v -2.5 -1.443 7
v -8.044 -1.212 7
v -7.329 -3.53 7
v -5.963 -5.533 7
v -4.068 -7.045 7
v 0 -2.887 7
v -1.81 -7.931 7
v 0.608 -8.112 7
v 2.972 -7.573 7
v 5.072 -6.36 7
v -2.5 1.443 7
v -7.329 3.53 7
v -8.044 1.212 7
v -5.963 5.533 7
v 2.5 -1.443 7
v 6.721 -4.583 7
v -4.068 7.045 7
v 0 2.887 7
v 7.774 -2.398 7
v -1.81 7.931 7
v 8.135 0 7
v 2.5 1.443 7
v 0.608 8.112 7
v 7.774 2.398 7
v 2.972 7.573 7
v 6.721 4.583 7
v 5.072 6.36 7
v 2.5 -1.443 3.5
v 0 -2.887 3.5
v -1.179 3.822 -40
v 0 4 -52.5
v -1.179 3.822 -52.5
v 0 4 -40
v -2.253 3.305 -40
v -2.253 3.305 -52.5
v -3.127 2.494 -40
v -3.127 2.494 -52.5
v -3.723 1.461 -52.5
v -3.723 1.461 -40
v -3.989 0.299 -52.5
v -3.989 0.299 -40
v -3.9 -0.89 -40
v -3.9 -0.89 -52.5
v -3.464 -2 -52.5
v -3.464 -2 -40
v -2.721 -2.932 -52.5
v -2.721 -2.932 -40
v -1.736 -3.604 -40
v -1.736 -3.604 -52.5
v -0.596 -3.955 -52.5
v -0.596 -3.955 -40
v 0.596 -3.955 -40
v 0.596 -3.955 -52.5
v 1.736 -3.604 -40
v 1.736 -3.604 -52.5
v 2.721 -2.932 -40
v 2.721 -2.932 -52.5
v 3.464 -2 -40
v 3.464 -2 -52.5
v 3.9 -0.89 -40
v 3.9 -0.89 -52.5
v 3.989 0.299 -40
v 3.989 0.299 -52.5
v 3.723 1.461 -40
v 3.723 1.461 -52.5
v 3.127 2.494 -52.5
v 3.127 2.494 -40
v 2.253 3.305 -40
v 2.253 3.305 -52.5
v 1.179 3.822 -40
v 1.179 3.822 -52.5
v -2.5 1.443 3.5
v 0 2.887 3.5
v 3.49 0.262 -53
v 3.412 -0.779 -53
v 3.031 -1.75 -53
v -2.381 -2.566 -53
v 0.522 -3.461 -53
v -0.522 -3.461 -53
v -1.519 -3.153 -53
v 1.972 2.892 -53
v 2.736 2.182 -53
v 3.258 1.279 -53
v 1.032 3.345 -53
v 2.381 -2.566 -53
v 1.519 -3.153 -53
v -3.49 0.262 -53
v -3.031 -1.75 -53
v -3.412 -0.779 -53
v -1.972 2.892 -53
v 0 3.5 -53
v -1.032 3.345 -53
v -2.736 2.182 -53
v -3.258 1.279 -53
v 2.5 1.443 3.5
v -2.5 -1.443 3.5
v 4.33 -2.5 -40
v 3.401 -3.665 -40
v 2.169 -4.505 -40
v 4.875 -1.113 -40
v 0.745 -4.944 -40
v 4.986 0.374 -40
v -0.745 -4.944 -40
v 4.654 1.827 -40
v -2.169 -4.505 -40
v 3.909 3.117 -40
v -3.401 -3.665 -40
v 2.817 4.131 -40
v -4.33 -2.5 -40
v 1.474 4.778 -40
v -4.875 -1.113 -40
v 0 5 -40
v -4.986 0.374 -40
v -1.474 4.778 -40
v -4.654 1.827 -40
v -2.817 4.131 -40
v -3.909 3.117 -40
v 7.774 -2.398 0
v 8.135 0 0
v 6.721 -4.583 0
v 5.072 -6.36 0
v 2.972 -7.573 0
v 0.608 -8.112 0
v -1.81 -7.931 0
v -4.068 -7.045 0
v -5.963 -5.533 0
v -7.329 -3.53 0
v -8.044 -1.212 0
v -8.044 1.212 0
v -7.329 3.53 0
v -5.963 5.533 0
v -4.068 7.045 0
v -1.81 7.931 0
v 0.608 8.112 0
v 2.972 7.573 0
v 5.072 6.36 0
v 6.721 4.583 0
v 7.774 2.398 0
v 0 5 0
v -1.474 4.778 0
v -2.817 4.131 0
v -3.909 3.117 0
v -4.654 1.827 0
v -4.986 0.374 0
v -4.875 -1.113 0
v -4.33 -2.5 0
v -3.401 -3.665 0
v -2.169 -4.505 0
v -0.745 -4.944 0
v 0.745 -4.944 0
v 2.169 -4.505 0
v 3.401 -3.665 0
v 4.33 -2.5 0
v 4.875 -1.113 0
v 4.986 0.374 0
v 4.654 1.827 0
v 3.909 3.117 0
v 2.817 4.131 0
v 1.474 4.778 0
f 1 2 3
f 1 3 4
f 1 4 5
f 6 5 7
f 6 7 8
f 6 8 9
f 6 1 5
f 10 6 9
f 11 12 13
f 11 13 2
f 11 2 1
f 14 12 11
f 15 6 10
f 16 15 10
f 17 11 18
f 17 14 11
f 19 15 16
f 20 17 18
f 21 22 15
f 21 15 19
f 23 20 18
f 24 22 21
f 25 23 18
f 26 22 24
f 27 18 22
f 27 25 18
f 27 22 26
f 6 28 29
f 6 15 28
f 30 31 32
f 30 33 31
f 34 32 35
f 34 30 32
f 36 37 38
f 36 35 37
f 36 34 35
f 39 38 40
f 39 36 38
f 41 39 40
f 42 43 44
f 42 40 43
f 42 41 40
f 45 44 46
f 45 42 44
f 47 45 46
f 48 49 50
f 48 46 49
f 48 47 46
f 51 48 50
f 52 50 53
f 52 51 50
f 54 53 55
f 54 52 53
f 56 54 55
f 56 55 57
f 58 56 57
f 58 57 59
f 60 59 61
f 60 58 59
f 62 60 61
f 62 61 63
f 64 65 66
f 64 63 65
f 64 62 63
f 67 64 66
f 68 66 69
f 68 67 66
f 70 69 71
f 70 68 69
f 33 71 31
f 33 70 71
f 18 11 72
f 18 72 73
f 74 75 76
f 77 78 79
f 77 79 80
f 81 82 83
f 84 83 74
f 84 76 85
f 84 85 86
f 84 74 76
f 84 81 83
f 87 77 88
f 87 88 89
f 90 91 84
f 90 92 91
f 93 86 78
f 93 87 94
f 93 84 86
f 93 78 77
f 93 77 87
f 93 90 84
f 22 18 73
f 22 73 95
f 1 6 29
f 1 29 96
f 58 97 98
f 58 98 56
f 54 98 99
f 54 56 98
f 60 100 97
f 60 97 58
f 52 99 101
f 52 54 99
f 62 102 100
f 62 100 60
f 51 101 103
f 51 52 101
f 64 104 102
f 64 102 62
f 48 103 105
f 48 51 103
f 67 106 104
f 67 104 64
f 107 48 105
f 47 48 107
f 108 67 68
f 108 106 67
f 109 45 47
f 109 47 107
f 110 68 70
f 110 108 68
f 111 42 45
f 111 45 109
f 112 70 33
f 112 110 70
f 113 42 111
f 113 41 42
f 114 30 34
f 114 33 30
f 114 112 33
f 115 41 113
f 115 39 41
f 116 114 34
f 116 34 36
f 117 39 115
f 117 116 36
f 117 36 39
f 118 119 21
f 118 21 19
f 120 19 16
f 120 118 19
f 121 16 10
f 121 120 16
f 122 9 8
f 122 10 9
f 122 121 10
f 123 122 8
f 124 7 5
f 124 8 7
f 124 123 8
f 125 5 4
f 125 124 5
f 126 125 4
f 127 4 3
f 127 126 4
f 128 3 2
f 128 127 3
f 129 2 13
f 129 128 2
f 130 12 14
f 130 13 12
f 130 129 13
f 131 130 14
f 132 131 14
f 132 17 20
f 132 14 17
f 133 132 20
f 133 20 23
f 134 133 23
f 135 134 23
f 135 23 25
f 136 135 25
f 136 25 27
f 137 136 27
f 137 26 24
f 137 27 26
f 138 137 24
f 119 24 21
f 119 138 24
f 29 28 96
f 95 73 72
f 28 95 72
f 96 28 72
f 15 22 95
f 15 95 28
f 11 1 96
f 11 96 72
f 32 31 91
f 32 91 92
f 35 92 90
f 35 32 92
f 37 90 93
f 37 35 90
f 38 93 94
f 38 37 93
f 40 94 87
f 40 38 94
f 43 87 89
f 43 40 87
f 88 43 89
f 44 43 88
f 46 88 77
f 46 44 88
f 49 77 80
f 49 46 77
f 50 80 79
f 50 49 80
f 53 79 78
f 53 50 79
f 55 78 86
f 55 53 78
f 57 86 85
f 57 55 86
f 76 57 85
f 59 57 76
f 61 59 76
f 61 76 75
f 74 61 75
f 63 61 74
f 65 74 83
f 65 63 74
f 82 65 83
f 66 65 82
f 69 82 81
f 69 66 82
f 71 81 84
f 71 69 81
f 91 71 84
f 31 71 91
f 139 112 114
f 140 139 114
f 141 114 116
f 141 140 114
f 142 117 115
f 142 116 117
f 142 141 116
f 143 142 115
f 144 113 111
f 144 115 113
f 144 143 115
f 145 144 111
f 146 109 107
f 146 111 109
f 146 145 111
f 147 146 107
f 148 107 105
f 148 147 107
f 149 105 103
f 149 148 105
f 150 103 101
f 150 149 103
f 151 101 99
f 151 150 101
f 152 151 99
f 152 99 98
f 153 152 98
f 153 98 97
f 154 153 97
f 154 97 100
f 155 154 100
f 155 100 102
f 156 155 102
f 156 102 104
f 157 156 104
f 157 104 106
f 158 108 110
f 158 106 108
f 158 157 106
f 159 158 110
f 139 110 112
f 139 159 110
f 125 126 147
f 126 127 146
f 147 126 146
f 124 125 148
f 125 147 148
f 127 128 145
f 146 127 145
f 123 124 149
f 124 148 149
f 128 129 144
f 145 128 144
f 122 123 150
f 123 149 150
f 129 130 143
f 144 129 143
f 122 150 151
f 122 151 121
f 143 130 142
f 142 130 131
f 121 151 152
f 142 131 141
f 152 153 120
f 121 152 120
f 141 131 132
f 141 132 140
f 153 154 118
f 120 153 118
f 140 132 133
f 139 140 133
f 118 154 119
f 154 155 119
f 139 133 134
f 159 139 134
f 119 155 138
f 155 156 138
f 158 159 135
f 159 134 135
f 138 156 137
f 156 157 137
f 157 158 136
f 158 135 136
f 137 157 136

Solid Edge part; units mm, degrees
sketch "Sketch1" plane through (0, 0, 0) normal (0, 0, 1) x (1, 0, 0)
  circle A0 centre (0, 0) radius 8.135
  dimension "D1" = 16.27
extrude "Protrusion1" add sketch "Sketch1" along normal blind 7
sketch "Sketch2" plane through (0, 0, 7) normal (0, 0, 1) x (1, 0, 0)
  line L0 (0, -2.8868) -> (-2.5, -1.4434)
  line L1 (-2.5, -1.4434) -> (-2.5, 1.4434)
  line L2 (-2.5, 1.4434) -> (0, 2.8868)
  line L3 (0, 2.8868) -> (2.5, 1.4434)
  line L4 (2.5, 1.4434) -> (2.5, -1.4434)
  line L5 (2.5, -1.4434) -> (0, -2.8868)
  dimension "D1" = 5
extrude "Cutout1" cut sketch "Sketch2" against normal blind 3.5
sketch "Sketch3" plane through (0, 0, 0) normal (0, 0, -1) x (0, 1, 0)
  circle A0 centre (0, 0) radius 5
  dimension "D1" = 10
extrude "Protrusion2" add sketch "Sketch3" along normal blind 40
sketch "Sketch4" plane through (0, 0, -40) normal (0, 0, -1) x (0, 1, 0)
  circle A0 centre (0, 0) radius 4
  dimension "D1" = 8
extrude "Protrusion3" add sketch "Sketch4" along normal blind 13
chamfer "Chamfer1" distance 0.5 angle 45 1 edges at (0, -4, -53)
properties part number "108082"
